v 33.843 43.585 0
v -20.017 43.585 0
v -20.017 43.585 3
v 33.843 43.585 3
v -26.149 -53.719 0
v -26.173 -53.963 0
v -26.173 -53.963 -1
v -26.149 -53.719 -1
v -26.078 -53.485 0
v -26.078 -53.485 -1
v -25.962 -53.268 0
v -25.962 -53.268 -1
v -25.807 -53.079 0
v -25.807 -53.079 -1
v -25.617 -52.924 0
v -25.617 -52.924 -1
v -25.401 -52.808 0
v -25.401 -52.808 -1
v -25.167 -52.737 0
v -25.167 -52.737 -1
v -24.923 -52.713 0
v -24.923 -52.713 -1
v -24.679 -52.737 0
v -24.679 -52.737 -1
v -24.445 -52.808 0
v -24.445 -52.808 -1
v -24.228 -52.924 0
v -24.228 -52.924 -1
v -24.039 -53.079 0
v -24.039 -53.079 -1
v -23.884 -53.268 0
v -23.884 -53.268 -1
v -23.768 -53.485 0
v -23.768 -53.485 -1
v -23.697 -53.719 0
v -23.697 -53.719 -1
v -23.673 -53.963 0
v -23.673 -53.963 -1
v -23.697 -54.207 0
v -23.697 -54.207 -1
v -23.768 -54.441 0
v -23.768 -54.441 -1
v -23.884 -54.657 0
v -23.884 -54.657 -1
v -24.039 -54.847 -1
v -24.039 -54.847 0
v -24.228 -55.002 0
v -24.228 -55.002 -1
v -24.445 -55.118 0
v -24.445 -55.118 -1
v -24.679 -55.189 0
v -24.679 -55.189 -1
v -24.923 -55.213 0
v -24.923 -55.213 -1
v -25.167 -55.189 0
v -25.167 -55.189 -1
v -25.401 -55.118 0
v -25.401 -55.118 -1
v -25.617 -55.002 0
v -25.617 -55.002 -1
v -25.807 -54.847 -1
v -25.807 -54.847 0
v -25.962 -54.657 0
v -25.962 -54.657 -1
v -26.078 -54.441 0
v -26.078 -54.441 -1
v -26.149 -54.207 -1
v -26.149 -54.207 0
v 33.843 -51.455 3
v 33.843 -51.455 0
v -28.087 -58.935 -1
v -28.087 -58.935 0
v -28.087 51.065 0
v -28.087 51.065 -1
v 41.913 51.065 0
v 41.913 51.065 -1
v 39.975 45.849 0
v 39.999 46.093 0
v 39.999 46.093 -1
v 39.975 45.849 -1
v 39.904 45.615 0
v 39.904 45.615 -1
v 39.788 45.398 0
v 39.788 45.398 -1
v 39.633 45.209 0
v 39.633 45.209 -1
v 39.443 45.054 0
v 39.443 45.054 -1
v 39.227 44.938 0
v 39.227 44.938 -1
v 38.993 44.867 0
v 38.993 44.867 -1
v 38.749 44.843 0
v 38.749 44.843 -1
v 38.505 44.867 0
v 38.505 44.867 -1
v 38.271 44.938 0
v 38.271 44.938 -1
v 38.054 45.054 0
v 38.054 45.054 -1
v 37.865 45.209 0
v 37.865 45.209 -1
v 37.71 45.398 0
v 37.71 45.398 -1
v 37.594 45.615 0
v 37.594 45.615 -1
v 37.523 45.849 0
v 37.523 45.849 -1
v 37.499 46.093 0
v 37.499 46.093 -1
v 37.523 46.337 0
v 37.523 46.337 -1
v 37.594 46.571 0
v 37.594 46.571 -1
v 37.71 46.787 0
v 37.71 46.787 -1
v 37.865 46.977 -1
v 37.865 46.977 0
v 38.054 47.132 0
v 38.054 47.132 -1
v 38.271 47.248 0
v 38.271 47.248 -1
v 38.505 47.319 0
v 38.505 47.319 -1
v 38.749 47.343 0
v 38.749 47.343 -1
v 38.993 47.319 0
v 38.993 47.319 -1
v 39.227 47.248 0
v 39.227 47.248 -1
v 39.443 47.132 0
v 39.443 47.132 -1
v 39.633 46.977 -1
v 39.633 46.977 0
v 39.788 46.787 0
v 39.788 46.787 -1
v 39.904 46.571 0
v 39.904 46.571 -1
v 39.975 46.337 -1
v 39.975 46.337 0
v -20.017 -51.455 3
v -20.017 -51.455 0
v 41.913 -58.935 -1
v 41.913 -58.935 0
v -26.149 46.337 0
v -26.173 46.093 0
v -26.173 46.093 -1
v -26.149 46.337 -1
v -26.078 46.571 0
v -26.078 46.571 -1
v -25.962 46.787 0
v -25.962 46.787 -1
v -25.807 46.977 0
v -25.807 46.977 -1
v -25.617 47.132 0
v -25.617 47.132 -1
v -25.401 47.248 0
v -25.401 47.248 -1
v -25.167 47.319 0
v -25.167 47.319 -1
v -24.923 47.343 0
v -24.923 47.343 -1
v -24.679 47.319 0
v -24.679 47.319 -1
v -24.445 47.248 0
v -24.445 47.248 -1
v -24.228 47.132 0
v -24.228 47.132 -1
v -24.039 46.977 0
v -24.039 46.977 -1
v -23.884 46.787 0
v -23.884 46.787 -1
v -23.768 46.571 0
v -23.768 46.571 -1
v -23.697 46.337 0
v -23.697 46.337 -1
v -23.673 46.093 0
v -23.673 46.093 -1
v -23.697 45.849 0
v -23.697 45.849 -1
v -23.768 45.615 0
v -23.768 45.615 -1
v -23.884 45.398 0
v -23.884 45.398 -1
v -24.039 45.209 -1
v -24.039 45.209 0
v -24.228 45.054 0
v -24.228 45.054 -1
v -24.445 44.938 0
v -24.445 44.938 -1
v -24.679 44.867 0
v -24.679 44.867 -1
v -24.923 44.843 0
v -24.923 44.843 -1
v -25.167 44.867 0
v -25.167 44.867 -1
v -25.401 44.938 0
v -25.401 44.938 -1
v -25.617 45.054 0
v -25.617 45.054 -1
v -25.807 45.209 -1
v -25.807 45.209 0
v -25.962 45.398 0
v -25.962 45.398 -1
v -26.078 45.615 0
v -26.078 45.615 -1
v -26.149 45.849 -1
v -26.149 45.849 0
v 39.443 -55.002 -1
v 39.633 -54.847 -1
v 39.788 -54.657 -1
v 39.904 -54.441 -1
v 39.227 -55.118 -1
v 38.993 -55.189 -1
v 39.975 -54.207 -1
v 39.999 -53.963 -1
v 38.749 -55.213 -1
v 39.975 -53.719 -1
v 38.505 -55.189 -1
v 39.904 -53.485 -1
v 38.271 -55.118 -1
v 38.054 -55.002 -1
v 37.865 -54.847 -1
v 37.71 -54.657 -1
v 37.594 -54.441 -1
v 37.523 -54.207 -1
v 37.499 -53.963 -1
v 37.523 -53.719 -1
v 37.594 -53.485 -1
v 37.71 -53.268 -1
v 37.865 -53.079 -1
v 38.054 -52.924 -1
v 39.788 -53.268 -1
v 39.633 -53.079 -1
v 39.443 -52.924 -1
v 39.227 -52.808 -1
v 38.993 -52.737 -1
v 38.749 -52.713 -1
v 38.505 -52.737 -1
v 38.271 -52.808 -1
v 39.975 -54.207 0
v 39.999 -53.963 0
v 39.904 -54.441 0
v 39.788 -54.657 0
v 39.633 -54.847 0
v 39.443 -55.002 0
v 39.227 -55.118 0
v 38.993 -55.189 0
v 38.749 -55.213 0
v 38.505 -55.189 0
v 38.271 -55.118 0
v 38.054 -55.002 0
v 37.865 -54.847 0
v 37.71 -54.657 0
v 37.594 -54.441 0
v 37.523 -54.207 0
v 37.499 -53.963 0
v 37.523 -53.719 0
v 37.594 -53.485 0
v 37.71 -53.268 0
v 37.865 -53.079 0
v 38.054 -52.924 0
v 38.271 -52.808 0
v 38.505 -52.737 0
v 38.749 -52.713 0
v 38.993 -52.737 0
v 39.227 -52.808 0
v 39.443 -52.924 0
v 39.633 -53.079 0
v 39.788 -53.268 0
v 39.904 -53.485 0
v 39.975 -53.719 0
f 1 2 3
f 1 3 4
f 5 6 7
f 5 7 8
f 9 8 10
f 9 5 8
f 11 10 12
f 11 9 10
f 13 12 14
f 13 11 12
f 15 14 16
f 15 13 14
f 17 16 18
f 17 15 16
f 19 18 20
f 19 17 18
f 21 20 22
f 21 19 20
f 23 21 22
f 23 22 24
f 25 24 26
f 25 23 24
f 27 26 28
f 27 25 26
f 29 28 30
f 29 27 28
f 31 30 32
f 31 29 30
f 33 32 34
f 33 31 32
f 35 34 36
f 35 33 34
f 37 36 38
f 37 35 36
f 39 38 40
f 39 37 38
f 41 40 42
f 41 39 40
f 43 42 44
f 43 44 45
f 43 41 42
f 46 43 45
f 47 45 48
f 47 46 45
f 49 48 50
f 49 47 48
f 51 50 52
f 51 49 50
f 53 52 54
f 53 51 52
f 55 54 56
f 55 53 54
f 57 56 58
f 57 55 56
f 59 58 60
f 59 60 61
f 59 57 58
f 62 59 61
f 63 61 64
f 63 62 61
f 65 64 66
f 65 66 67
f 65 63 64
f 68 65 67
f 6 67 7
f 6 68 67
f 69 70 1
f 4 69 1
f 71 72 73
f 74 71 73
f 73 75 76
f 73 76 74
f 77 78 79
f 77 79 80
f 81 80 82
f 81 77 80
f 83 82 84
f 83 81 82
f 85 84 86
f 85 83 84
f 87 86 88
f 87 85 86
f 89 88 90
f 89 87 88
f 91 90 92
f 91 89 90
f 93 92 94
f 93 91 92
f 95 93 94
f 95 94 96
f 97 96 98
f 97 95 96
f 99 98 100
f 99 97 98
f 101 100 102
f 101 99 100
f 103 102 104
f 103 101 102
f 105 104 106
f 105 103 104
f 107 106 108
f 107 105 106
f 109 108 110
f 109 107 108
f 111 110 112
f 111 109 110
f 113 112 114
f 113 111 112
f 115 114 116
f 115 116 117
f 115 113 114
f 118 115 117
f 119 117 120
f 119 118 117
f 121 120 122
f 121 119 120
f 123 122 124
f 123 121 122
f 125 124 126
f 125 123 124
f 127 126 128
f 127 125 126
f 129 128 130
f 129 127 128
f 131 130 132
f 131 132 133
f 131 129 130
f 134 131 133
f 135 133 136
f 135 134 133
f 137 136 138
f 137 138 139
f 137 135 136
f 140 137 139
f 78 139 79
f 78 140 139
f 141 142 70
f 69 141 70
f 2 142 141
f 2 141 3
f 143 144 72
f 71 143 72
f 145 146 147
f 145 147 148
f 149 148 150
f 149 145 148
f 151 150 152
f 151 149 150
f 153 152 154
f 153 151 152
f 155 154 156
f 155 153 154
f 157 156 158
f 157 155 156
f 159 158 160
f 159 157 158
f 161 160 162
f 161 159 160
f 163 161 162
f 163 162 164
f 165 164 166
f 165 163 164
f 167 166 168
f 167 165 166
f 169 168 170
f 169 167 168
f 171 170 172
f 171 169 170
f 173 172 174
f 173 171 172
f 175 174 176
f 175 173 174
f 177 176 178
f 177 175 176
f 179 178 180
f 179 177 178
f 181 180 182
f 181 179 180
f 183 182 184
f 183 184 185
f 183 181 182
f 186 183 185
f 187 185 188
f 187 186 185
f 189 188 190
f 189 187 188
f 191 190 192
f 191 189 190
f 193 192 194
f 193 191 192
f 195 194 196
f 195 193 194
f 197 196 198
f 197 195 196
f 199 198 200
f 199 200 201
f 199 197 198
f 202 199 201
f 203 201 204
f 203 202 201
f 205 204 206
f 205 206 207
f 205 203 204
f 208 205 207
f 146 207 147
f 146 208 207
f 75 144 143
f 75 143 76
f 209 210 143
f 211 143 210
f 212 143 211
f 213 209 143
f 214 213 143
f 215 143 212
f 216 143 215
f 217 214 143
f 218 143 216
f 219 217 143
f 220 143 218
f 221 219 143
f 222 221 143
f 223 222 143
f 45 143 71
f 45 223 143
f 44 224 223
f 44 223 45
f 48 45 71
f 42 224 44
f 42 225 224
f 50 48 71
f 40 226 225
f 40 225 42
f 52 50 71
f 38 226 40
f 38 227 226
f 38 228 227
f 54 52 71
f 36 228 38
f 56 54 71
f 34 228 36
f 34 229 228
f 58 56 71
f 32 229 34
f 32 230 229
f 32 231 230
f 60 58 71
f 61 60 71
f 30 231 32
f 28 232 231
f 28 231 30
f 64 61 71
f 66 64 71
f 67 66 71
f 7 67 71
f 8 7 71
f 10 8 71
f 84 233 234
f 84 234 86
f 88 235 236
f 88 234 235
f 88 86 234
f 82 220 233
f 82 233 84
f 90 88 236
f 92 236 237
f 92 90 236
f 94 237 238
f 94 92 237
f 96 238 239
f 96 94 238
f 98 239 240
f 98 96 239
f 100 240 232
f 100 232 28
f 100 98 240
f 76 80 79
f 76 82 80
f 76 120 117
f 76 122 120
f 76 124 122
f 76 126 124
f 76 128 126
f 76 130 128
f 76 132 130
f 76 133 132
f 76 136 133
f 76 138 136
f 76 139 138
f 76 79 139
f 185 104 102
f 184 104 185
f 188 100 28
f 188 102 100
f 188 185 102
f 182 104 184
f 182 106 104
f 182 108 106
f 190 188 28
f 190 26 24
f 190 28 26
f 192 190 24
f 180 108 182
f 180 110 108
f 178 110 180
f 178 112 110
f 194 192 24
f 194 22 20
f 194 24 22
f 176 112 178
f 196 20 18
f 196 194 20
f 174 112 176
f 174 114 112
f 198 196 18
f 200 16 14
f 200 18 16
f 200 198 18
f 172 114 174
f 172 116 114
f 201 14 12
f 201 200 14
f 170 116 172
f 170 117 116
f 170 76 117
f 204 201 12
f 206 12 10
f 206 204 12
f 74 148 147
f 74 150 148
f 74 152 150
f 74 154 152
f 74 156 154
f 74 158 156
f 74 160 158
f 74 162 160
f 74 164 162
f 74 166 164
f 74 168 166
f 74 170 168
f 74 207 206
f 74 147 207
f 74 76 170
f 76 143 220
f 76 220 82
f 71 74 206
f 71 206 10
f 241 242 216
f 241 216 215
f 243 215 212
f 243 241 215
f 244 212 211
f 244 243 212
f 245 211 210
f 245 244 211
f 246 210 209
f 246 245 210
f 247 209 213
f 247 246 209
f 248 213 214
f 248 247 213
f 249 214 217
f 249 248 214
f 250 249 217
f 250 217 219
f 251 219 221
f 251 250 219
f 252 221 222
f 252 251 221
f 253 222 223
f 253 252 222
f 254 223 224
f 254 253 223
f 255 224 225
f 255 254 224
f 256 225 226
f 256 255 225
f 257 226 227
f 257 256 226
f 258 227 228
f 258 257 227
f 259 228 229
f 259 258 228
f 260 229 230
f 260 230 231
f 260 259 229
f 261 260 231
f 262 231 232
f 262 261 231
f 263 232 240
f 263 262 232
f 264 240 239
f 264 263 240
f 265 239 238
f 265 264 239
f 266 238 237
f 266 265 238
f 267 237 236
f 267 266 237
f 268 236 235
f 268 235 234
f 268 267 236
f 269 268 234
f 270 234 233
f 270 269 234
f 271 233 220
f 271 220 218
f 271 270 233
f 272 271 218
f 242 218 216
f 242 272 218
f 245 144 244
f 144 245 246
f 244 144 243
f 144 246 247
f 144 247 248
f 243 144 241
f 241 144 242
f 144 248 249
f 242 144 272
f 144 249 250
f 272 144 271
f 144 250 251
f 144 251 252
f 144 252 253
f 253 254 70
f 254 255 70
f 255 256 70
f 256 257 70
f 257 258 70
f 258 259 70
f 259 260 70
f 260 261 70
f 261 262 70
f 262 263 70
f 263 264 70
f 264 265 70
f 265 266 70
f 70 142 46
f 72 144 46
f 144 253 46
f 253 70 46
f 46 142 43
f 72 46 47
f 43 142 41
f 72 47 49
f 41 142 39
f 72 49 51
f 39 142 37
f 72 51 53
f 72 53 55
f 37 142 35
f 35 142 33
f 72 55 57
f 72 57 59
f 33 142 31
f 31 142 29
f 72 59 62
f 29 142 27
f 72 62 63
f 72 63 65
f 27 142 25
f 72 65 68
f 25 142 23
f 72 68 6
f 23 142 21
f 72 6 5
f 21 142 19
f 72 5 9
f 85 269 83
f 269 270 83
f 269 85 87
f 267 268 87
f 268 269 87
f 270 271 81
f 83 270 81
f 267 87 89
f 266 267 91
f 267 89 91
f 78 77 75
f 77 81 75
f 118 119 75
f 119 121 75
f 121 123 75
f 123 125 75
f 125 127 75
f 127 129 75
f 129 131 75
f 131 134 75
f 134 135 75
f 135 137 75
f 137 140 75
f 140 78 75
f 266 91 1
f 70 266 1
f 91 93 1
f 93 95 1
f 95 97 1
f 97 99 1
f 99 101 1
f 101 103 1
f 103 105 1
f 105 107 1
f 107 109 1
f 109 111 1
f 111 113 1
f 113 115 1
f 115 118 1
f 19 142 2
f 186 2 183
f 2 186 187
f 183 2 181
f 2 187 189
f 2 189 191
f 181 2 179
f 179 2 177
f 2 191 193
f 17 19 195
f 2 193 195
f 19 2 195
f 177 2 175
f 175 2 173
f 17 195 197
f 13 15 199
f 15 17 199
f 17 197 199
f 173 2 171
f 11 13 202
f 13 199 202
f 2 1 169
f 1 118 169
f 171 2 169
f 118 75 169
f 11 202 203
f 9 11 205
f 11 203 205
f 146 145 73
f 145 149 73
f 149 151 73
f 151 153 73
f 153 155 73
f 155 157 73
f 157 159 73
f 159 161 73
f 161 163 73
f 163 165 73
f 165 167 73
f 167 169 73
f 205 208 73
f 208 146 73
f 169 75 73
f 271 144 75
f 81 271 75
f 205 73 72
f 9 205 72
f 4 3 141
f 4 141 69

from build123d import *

# Parameters (mm, degrees)
SKETCH2_W           = 53.86
SKETCH2_H           = 95.04
BOSS_EXTRUDE1_DEPTH = 3
SKETCH3_W           = 70
SKETCH3_H           = 110
SKETCH3_R           = 1.25
BOSS_EXTRUDE2_DEPTH = 1


with BuildPart() as part:
    # Sketch2 → Boss-Extrude1 (new body)
    with BuildSketch(Plane.XY):
        with Locations((6.912993197, -3.934965986)):
            Rectangle(SKETCH2_W, SKETCH2_H)
    extrude(amount=BOSS_EXTRUDE1_DEPTH)

    # Sketch3 → Boss-Extrude2 (add)
    with BuildSketch(Plane(origin=(0, 0, 0), x_dir=(-1, 0, 0), z_dir=(0, 0, -1))):
        with Locations((-6.912993197, -3.934965986)):
            Rectangle(SKETCH3_W, SKETCH3_H)
        with Locations((24.922942909, 46.09293361)):
            Circle(SKETCH3_R, mode=Mode.SUBTRACT)
        with Locations((24.922942909, -53.962865582)):
            Circle(SKETCH3_R, mode=Mode.SUBTRACT)
        with Locations(Location((-38.748929304, 46.09293361, 0), (0, 0, 180))):
            Circle(SKETCH3_R, mode=Mode.SUBTRACT)
        with Locations(Location((-38.748929304, -53.962865582, 0), (0, 0, 180))):
            Circle(SKETCH3_R, mode=Mode.SUBTRACT)
    extrude(amount=BOSS_EXTRUDE2_DEPTH)


solid = part.part
